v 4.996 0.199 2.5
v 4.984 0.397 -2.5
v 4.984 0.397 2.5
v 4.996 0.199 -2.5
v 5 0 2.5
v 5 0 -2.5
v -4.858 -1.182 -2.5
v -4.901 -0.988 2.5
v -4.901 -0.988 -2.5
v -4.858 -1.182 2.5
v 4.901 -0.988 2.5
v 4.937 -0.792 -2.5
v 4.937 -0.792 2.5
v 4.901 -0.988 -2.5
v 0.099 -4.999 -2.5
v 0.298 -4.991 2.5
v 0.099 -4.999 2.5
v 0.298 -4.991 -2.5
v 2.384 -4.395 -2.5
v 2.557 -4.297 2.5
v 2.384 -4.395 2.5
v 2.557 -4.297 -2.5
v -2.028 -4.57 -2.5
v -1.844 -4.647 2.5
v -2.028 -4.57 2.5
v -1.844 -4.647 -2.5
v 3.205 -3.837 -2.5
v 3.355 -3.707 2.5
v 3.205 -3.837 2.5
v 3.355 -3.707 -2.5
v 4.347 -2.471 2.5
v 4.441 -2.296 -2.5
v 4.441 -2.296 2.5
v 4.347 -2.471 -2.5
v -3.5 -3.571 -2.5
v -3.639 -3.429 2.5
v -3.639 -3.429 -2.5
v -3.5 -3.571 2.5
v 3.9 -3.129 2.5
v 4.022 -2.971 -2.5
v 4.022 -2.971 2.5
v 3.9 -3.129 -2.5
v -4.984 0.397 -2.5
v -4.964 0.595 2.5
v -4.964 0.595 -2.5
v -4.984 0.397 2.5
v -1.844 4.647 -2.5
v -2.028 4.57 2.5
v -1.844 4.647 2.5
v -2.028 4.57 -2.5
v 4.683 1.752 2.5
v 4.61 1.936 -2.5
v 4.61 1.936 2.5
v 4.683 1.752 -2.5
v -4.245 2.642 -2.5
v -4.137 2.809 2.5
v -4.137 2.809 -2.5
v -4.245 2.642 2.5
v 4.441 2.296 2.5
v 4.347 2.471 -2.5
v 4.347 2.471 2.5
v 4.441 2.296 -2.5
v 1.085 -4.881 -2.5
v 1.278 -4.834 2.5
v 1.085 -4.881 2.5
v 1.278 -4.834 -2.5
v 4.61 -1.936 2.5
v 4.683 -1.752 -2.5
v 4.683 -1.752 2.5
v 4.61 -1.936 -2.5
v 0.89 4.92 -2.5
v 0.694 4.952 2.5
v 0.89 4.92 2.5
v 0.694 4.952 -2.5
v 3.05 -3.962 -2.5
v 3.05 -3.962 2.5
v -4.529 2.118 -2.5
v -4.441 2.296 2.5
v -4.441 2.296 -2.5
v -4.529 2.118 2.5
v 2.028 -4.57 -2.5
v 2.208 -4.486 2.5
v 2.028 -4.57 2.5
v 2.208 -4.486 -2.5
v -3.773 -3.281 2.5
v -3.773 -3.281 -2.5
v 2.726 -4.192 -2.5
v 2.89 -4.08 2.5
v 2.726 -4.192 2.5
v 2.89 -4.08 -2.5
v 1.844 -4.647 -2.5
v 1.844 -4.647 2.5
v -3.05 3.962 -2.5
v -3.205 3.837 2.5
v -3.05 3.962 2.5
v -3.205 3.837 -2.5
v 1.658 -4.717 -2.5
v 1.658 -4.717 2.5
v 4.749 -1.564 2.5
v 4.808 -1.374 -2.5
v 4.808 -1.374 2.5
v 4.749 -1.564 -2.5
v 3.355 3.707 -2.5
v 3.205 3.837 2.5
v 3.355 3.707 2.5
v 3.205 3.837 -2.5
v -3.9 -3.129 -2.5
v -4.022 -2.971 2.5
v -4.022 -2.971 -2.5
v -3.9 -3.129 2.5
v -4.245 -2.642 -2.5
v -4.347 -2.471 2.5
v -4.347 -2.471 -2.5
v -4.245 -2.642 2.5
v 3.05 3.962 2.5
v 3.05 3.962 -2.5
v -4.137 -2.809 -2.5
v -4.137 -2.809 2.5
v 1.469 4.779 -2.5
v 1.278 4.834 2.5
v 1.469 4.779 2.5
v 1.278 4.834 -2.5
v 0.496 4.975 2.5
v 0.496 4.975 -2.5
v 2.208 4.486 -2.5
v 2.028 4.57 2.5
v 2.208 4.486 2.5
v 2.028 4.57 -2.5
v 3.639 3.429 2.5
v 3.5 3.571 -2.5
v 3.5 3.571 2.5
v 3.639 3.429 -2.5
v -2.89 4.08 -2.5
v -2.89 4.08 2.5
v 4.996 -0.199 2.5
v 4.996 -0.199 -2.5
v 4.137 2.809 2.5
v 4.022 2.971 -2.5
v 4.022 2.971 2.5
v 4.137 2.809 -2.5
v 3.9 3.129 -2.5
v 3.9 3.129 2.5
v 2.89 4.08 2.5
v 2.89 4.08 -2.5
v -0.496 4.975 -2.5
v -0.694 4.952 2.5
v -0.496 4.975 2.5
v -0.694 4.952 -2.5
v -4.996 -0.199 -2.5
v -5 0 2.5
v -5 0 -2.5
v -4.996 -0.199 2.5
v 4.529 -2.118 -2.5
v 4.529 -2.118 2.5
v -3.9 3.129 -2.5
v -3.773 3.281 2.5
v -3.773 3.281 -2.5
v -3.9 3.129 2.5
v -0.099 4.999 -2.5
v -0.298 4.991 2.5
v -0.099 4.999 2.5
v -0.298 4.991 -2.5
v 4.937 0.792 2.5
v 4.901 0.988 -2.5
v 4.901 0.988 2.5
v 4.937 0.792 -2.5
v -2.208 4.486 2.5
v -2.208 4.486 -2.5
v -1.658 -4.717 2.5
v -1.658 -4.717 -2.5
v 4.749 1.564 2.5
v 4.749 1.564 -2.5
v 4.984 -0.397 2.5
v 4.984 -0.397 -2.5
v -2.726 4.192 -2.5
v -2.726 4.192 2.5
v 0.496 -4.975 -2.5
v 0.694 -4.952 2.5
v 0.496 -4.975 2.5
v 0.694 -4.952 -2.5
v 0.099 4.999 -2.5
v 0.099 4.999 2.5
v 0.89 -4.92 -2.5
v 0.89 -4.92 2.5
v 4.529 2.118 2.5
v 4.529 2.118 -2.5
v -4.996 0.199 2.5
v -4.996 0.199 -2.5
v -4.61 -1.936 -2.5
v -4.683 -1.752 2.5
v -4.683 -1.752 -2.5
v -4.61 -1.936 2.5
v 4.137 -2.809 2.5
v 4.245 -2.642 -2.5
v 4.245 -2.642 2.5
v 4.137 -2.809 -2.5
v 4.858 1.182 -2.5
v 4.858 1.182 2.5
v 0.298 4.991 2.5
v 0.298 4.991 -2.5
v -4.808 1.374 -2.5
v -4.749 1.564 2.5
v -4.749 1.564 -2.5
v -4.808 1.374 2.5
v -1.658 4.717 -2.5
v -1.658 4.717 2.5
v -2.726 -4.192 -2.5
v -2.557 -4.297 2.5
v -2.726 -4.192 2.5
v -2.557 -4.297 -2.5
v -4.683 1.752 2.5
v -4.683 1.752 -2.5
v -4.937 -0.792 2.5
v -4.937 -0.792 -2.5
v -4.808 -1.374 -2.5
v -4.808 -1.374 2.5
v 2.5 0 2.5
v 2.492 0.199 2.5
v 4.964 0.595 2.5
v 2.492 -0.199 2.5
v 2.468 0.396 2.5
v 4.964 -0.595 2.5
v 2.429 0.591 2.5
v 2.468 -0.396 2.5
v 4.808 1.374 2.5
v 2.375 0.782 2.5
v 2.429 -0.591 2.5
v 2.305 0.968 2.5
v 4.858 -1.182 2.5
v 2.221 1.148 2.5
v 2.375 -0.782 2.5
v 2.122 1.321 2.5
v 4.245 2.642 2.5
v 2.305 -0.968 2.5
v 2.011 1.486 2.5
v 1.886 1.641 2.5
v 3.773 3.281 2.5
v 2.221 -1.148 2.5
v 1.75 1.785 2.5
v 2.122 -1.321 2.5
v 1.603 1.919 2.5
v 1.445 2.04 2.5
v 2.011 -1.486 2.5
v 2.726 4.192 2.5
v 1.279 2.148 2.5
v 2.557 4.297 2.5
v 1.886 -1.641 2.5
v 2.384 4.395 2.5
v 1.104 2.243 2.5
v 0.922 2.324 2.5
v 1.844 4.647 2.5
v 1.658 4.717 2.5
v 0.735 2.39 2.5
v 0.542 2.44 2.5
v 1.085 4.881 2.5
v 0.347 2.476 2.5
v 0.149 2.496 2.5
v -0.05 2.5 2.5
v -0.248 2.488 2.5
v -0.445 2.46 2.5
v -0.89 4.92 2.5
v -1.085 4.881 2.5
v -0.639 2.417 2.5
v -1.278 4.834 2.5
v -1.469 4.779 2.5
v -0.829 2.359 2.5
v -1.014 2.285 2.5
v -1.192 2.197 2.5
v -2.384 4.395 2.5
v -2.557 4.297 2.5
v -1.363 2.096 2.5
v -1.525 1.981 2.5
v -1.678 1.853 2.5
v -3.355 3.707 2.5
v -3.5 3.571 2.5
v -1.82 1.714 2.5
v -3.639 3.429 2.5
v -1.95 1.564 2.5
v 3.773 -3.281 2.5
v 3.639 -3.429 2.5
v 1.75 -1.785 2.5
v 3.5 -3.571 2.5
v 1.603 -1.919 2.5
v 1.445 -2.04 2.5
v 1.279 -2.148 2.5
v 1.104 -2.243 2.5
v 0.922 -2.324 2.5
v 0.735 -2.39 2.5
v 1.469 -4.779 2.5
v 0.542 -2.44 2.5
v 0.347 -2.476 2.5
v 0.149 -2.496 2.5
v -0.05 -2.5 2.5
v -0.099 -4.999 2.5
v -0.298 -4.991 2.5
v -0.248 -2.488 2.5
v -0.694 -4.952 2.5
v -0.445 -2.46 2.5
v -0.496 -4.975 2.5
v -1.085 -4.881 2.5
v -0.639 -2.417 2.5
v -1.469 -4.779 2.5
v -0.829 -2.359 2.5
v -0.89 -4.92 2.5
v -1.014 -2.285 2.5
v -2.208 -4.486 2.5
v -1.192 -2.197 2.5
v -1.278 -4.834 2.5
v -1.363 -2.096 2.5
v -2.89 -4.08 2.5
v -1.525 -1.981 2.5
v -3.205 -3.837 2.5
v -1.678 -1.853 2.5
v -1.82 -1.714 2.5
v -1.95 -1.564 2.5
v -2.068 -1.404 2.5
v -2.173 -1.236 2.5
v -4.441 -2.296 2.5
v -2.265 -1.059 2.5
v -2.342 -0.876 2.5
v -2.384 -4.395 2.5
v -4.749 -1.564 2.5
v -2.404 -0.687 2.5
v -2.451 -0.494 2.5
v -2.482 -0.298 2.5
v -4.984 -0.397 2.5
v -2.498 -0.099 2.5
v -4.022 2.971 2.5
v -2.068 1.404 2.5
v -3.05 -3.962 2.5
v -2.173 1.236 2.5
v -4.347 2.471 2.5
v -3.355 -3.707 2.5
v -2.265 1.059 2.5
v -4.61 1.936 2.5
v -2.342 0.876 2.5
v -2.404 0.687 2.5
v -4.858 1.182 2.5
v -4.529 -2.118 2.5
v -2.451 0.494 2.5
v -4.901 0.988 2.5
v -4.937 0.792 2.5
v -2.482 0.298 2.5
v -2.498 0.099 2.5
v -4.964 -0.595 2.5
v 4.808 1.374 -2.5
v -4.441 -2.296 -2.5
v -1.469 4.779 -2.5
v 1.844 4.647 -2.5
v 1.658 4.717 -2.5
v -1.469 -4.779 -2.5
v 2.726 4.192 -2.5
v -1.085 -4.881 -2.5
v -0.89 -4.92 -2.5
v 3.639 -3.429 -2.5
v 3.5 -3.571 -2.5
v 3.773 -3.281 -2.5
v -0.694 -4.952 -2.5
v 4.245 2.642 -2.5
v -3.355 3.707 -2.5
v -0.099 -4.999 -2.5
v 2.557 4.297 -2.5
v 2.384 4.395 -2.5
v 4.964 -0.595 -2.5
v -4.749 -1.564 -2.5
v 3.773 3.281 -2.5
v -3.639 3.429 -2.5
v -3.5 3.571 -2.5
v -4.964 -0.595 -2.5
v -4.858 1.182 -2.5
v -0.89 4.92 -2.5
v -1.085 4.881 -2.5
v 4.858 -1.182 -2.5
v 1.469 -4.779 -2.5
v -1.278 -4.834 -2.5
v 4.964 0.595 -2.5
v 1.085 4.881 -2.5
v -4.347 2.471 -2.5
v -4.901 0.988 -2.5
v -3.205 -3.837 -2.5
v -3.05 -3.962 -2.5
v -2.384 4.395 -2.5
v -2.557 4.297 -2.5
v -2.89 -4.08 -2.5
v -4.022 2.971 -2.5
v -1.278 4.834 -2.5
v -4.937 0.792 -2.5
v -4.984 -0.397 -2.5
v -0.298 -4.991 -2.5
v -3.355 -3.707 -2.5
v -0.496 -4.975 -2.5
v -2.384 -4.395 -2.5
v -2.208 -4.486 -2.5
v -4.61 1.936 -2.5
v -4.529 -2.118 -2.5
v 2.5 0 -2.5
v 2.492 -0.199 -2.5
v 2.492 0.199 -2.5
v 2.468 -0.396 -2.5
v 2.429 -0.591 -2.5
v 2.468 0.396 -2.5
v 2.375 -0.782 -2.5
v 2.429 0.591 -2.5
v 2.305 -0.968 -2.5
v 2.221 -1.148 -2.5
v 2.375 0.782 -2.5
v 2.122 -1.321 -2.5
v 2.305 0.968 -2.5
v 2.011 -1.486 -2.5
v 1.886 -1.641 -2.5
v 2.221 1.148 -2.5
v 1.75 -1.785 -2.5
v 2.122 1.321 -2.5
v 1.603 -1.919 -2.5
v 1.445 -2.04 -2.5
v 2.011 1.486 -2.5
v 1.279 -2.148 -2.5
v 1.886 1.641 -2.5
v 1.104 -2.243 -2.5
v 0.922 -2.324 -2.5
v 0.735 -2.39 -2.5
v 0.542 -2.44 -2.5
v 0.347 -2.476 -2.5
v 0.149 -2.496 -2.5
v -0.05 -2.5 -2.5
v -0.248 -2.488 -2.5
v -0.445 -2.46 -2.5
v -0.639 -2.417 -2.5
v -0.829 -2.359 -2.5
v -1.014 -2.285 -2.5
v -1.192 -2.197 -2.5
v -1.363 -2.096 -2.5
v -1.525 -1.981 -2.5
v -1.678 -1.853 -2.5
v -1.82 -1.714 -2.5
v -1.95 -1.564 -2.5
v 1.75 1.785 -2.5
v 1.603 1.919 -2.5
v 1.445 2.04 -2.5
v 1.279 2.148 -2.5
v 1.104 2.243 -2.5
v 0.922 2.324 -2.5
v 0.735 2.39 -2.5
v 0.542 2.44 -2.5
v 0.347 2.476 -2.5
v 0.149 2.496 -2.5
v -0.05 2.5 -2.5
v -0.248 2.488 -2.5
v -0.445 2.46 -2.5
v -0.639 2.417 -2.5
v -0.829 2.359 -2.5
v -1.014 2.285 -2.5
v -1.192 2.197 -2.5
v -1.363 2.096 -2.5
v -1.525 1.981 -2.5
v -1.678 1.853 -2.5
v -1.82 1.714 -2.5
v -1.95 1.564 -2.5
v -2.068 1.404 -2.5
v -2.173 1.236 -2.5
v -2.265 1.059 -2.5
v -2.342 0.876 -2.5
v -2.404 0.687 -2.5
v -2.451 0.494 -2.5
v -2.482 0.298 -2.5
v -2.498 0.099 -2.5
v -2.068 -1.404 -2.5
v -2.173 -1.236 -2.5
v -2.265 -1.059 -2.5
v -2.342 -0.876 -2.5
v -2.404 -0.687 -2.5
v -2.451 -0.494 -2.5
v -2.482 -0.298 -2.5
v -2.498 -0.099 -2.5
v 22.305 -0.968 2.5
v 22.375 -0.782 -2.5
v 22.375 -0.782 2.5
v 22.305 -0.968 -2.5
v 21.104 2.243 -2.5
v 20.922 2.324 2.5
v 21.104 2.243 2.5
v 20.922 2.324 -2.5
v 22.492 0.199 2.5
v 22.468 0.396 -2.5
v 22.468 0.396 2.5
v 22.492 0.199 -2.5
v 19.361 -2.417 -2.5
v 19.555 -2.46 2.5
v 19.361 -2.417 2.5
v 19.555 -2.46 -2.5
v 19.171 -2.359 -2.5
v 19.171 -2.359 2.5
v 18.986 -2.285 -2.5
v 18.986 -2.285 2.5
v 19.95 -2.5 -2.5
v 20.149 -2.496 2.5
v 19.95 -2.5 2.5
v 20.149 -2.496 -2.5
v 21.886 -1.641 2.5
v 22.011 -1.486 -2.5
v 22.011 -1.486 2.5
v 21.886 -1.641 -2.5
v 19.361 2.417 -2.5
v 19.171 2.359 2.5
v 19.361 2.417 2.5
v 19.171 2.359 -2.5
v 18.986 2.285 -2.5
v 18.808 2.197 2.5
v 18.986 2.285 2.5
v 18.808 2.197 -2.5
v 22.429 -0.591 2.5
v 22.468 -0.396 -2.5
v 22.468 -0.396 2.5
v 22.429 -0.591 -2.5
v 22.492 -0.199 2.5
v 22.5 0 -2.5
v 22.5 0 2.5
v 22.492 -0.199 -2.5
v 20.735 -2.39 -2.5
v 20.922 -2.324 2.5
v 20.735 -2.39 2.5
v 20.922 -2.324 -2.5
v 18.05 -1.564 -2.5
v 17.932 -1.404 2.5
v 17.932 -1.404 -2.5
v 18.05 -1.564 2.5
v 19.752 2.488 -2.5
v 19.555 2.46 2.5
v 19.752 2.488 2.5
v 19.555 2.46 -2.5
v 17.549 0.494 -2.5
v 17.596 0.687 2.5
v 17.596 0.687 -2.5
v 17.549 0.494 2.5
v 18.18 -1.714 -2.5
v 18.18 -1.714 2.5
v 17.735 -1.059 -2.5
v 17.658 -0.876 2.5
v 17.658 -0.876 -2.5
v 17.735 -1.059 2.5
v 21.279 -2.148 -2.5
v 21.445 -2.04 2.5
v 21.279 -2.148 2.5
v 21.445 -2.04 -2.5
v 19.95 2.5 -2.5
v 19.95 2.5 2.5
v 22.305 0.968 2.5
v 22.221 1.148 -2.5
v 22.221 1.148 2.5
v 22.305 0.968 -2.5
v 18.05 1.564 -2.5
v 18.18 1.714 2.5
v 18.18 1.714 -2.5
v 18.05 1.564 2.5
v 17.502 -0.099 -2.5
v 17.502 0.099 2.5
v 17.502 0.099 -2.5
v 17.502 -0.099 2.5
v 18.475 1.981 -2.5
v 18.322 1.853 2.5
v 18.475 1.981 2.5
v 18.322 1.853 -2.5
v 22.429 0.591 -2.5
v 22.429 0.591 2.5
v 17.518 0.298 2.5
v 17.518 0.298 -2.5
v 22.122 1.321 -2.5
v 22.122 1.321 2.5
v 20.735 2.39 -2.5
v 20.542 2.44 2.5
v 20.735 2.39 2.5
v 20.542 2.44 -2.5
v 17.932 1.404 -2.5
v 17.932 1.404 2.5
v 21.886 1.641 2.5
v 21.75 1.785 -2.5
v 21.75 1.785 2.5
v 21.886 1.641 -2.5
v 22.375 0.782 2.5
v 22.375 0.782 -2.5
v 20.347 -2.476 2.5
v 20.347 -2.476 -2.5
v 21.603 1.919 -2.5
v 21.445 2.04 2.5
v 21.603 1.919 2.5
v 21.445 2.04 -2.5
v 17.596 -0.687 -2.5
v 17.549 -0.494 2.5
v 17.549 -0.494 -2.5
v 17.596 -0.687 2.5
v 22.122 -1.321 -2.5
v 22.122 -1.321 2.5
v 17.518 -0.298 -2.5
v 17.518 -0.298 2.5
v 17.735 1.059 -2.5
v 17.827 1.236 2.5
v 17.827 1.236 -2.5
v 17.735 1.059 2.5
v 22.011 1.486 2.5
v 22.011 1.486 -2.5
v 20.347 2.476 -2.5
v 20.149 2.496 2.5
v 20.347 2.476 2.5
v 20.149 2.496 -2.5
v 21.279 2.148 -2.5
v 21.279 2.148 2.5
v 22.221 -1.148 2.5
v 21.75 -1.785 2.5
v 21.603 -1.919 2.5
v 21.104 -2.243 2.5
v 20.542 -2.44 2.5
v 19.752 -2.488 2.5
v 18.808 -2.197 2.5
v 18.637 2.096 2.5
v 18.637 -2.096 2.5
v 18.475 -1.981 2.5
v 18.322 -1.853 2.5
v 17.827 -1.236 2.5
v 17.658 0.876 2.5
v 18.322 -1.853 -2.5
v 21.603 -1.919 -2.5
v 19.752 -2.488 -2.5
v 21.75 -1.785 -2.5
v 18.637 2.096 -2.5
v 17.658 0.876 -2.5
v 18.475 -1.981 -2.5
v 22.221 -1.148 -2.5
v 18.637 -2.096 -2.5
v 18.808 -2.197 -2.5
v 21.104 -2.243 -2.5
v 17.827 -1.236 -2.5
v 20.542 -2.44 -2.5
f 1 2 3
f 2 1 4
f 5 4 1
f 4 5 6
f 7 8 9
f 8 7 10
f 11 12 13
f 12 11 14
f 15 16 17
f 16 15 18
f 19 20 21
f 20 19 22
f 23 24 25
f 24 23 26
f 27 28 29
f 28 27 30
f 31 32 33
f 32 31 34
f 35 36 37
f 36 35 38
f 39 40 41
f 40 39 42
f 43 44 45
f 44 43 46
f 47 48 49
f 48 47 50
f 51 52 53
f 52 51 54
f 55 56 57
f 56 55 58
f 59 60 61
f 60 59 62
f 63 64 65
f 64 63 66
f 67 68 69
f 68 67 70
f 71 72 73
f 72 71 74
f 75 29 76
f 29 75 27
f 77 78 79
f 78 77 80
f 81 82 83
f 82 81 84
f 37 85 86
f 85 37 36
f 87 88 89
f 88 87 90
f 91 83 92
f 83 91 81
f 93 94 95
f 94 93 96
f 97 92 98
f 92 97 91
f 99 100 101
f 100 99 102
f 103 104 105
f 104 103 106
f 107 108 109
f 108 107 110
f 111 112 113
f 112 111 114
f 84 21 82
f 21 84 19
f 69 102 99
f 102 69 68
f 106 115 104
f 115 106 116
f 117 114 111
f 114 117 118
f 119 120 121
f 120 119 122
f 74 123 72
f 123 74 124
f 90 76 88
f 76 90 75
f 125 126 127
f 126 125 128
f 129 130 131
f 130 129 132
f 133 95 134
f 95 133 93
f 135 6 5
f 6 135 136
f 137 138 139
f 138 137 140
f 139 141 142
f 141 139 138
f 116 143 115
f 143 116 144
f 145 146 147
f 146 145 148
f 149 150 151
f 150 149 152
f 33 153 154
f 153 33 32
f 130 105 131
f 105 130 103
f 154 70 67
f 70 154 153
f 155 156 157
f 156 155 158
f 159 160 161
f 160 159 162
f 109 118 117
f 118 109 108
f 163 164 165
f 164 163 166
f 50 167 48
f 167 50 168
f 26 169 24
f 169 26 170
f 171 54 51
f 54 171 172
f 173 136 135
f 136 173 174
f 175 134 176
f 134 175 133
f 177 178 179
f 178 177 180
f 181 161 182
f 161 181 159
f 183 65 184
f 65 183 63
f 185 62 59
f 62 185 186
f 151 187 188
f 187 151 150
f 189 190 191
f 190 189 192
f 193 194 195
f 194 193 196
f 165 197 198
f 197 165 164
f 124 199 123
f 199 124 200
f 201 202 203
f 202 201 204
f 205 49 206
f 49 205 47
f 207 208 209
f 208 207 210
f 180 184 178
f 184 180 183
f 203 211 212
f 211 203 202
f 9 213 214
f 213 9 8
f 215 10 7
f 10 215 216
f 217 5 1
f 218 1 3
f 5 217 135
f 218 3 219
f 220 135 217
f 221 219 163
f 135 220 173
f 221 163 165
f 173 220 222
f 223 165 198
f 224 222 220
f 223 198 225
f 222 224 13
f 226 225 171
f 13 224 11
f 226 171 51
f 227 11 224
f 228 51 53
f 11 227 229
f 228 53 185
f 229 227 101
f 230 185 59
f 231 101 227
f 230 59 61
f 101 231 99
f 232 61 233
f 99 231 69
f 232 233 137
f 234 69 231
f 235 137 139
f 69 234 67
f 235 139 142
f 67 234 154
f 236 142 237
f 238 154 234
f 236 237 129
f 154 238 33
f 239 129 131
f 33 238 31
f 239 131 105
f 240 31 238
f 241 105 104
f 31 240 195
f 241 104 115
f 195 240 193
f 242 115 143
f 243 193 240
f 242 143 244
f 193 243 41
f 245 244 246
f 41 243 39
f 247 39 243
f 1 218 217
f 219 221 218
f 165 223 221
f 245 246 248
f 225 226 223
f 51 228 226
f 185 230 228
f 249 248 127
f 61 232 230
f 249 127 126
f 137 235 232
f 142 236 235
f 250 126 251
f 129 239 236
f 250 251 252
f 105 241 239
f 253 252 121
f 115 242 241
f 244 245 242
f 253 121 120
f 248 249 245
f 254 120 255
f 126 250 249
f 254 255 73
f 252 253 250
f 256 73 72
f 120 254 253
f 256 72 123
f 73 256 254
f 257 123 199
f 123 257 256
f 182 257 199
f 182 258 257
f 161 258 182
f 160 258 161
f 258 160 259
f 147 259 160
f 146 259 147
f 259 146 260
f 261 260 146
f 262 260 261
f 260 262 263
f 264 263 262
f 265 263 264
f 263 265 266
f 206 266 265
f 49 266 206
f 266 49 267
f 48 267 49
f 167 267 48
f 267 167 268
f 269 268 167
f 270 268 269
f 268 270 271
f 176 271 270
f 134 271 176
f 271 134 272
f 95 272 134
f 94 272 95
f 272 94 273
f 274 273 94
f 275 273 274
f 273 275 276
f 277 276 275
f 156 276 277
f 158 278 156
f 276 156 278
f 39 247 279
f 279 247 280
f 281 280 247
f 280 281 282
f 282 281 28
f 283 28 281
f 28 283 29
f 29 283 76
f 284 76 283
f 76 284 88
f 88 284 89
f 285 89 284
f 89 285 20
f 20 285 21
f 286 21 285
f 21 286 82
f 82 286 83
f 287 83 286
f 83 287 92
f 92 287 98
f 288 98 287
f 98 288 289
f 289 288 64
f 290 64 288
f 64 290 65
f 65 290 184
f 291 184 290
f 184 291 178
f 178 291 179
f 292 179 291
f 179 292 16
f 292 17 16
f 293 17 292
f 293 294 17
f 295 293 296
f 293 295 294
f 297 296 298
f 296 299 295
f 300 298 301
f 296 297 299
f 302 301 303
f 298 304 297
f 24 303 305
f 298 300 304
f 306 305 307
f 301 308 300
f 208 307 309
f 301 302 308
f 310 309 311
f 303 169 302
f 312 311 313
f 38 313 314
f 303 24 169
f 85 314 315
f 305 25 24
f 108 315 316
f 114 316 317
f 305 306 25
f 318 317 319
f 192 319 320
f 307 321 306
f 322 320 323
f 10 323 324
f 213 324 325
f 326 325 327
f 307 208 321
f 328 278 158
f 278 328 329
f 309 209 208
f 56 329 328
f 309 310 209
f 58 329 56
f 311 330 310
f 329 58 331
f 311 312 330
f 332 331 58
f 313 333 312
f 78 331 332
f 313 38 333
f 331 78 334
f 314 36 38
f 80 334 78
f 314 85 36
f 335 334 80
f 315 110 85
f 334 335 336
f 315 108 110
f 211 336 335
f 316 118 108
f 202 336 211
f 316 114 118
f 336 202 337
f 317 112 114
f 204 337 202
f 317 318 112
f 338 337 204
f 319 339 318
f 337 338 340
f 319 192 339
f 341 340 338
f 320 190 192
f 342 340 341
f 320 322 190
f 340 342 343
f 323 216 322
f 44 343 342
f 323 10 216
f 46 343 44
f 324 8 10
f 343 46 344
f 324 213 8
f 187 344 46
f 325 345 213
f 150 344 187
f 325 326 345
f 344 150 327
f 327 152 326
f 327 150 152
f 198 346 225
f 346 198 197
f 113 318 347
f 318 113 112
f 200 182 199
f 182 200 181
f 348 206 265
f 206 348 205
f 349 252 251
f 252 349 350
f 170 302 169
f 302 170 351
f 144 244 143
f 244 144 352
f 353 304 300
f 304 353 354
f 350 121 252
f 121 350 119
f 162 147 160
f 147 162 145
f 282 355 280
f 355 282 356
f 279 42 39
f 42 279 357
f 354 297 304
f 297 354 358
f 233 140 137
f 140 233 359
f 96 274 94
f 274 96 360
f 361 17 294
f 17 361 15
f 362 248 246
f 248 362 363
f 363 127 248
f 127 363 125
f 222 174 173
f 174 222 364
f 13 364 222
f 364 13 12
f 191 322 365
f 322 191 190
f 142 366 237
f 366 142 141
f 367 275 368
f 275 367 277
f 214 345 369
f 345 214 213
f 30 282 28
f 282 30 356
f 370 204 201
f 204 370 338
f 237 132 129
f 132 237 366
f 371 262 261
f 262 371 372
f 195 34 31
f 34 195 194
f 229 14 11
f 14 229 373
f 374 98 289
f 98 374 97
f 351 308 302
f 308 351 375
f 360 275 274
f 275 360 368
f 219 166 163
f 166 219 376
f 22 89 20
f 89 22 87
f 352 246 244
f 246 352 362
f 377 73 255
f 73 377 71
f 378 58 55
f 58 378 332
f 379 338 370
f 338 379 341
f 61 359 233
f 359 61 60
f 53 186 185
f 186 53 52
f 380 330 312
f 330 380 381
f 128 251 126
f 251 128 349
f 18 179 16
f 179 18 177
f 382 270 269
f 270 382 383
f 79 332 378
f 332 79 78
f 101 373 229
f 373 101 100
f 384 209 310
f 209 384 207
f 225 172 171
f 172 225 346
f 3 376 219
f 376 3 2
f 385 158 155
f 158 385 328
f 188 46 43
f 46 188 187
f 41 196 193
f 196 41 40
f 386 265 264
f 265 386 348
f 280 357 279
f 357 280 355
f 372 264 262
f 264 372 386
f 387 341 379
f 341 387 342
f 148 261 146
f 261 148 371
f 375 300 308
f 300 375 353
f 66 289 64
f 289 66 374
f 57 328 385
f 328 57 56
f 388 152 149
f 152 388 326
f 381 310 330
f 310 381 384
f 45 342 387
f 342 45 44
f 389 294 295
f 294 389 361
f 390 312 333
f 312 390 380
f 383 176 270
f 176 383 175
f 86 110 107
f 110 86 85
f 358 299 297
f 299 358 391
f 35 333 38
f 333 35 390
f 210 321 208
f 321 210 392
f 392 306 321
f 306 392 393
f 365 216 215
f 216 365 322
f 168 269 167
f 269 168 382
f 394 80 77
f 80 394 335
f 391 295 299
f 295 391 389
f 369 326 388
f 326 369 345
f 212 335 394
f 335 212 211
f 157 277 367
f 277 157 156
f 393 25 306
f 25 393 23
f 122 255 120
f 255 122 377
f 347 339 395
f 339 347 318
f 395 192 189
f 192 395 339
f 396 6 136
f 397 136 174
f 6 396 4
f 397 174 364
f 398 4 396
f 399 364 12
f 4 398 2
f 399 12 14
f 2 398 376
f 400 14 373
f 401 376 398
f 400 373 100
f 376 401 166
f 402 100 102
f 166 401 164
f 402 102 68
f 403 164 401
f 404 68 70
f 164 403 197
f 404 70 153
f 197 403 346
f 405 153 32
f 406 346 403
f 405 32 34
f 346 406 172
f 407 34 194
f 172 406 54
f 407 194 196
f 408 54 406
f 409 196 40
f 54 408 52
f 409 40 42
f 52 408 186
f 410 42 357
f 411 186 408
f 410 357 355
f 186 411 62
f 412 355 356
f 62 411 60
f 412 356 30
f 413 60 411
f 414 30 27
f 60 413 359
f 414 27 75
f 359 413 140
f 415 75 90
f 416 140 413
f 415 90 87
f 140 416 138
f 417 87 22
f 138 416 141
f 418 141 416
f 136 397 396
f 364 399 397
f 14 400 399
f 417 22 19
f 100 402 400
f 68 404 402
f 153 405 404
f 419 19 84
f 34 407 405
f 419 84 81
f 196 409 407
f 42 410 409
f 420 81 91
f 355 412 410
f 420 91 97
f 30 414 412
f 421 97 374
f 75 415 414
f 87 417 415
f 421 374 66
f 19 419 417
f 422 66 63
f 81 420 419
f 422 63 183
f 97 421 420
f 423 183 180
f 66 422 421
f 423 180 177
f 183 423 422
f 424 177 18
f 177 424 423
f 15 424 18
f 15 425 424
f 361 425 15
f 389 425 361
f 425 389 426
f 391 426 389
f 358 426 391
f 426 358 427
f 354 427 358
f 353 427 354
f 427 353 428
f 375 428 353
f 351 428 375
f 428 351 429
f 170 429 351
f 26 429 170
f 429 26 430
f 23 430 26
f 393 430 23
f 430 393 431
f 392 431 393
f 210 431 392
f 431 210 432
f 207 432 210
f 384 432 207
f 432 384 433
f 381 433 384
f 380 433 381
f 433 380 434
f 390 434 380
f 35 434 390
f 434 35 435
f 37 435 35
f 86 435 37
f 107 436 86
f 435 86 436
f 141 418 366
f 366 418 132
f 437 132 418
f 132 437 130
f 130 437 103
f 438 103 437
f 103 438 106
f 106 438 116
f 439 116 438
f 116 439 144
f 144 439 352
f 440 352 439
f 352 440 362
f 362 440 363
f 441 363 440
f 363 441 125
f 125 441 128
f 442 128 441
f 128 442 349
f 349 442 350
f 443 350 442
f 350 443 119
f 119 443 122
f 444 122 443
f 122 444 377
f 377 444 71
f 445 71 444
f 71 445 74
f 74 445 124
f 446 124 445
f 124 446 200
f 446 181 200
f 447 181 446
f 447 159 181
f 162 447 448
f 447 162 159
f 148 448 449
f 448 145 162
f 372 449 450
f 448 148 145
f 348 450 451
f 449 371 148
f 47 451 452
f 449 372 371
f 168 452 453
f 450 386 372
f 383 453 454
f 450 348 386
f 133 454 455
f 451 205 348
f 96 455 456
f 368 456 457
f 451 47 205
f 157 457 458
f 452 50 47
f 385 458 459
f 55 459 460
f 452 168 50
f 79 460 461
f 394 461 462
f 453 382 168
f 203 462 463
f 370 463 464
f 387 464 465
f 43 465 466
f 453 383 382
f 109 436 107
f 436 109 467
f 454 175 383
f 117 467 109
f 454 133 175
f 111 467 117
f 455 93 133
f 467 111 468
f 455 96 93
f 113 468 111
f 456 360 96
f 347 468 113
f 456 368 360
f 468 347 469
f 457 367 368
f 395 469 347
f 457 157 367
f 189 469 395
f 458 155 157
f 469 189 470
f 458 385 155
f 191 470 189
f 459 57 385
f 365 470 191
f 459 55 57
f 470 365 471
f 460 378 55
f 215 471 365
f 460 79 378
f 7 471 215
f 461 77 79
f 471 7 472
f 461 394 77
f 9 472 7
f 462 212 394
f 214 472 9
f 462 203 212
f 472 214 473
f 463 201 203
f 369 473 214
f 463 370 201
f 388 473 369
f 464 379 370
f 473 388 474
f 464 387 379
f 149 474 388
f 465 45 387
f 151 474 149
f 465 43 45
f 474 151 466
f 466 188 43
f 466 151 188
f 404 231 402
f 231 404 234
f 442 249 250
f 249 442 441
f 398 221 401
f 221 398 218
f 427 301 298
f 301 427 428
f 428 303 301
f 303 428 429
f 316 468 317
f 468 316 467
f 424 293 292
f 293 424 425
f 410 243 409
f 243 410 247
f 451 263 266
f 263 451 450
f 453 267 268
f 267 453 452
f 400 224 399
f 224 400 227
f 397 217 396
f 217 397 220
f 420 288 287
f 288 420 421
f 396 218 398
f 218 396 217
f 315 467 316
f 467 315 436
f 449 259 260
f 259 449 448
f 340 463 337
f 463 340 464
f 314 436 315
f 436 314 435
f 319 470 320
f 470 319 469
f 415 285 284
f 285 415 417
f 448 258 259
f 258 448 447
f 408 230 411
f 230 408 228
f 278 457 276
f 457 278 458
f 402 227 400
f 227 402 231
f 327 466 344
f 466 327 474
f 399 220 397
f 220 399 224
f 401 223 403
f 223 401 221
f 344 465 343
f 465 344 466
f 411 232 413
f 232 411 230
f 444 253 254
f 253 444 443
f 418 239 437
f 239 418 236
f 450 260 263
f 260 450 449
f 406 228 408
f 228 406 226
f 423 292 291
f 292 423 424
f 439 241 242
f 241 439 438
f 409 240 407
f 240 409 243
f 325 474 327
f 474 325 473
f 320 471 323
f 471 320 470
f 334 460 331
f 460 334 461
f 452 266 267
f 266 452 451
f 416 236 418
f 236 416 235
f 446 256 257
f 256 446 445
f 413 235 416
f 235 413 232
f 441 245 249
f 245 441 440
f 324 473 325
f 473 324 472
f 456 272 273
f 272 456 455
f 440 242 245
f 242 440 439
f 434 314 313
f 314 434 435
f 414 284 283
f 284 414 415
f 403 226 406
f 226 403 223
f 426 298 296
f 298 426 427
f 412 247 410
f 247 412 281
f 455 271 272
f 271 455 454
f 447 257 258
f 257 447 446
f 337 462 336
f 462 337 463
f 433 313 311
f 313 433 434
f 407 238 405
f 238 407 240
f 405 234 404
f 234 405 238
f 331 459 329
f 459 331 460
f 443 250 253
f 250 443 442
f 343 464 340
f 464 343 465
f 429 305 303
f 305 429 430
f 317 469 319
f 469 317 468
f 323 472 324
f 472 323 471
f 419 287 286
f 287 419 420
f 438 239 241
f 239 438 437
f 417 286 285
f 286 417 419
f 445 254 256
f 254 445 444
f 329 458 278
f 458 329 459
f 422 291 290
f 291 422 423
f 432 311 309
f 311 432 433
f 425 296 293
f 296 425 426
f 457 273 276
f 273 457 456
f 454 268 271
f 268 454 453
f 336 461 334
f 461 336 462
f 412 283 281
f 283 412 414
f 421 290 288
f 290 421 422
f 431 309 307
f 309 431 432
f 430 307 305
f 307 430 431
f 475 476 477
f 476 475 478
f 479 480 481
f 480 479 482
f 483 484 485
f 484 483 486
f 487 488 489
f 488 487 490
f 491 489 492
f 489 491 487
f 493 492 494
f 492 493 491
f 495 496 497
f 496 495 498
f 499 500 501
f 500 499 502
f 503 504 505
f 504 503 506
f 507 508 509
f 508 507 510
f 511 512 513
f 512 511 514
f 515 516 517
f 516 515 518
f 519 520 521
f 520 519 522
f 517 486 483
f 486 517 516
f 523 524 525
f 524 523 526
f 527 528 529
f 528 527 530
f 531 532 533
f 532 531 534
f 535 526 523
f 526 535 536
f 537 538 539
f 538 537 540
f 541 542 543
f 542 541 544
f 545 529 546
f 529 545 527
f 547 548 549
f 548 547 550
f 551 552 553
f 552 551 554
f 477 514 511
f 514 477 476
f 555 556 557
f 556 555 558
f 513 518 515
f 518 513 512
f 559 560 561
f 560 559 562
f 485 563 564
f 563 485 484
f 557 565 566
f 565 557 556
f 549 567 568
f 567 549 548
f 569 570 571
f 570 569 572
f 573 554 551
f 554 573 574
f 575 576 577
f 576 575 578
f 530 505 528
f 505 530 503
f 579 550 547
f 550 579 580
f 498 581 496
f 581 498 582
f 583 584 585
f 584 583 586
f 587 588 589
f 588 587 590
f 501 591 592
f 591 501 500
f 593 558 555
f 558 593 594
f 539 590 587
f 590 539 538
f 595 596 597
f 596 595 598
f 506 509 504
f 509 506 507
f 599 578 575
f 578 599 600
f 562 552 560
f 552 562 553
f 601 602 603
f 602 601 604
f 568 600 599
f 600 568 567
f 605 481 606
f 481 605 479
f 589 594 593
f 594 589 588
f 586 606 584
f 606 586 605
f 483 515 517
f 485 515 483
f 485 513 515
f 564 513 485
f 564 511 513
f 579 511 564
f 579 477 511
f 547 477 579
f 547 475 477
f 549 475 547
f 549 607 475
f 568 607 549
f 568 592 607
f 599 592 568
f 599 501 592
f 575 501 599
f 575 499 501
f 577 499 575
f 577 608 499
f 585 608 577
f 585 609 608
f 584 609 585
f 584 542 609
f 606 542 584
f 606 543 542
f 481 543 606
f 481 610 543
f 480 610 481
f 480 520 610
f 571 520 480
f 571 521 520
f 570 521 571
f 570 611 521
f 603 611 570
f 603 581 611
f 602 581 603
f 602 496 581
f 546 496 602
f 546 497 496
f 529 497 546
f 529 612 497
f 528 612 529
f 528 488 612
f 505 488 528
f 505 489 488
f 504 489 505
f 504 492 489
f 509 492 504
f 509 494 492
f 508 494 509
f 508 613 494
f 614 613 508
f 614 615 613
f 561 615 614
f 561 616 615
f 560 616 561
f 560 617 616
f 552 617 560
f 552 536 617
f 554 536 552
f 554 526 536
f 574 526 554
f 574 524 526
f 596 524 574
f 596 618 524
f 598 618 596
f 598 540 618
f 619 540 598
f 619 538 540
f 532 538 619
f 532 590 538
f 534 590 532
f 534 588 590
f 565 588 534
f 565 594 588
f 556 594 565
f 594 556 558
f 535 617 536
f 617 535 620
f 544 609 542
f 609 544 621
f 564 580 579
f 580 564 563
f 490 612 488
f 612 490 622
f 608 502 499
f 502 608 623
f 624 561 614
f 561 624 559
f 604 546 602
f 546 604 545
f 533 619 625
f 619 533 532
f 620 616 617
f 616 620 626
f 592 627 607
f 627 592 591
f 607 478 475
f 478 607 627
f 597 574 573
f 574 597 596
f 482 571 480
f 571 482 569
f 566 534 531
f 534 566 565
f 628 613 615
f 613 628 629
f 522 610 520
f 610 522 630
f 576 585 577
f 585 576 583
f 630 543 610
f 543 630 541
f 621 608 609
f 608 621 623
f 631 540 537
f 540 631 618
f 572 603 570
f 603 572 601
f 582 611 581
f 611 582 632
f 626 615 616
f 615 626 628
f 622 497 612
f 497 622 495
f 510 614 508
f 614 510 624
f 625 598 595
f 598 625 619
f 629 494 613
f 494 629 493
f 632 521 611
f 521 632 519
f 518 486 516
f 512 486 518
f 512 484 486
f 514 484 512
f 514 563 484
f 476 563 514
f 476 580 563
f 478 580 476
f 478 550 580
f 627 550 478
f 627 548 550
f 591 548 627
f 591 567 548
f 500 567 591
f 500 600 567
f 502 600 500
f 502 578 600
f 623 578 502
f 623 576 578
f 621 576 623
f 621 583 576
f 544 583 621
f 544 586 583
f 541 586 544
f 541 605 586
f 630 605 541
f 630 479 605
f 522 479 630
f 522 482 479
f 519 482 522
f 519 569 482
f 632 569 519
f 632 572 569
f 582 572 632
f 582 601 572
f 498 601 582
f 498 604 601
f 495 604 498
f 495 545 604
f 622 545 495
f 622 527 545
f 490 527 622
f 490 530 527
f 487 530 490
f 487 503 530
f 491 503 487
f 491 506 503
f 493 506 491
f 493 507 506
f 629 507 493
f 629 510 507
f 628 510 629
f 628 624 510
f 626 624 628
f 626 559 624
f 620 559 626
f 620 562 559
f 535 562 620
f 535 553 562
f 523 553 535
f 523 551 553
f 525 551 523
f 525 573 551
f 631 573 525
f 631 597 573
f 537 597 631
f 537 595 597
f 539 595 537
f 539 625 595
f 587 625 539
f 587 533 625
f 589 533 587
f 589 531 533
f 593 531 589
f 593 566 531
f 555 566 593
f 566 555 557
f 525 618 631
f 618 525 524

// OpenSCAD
//Module to create a knurl pocket suitable for Heat-set inserts

// Articles about knurl insert
//https://hackaday.com/2019/02/28/threading-3d-printed-parts-how-to-use-heat-set-inserts/
//https://clevercreations.org/brass-threaded-inserts-plastic-3d-printing/

//Global vars
$fa = 1;
$fs = 0.2;
knurl_radius = 2.5;
knurl_wall = 2.5;


module m3knurl_ring(knurl_depth = 5)
{

    difference() {   
        cylinder(h=knurl_depth, r=knurl_radius+knurl_wall,center=true);
        m3knurl_pocket(knurl_depth = 5);
    }
    
}

module m3knurl_pocket(knurl_depth = 5)
{
 cylinder(h=knurl_depth+0.001, r=knurl_radius,center=true);
}

m3knurl_ring();
translate([20,0,0]) m3knurl_pocket();
